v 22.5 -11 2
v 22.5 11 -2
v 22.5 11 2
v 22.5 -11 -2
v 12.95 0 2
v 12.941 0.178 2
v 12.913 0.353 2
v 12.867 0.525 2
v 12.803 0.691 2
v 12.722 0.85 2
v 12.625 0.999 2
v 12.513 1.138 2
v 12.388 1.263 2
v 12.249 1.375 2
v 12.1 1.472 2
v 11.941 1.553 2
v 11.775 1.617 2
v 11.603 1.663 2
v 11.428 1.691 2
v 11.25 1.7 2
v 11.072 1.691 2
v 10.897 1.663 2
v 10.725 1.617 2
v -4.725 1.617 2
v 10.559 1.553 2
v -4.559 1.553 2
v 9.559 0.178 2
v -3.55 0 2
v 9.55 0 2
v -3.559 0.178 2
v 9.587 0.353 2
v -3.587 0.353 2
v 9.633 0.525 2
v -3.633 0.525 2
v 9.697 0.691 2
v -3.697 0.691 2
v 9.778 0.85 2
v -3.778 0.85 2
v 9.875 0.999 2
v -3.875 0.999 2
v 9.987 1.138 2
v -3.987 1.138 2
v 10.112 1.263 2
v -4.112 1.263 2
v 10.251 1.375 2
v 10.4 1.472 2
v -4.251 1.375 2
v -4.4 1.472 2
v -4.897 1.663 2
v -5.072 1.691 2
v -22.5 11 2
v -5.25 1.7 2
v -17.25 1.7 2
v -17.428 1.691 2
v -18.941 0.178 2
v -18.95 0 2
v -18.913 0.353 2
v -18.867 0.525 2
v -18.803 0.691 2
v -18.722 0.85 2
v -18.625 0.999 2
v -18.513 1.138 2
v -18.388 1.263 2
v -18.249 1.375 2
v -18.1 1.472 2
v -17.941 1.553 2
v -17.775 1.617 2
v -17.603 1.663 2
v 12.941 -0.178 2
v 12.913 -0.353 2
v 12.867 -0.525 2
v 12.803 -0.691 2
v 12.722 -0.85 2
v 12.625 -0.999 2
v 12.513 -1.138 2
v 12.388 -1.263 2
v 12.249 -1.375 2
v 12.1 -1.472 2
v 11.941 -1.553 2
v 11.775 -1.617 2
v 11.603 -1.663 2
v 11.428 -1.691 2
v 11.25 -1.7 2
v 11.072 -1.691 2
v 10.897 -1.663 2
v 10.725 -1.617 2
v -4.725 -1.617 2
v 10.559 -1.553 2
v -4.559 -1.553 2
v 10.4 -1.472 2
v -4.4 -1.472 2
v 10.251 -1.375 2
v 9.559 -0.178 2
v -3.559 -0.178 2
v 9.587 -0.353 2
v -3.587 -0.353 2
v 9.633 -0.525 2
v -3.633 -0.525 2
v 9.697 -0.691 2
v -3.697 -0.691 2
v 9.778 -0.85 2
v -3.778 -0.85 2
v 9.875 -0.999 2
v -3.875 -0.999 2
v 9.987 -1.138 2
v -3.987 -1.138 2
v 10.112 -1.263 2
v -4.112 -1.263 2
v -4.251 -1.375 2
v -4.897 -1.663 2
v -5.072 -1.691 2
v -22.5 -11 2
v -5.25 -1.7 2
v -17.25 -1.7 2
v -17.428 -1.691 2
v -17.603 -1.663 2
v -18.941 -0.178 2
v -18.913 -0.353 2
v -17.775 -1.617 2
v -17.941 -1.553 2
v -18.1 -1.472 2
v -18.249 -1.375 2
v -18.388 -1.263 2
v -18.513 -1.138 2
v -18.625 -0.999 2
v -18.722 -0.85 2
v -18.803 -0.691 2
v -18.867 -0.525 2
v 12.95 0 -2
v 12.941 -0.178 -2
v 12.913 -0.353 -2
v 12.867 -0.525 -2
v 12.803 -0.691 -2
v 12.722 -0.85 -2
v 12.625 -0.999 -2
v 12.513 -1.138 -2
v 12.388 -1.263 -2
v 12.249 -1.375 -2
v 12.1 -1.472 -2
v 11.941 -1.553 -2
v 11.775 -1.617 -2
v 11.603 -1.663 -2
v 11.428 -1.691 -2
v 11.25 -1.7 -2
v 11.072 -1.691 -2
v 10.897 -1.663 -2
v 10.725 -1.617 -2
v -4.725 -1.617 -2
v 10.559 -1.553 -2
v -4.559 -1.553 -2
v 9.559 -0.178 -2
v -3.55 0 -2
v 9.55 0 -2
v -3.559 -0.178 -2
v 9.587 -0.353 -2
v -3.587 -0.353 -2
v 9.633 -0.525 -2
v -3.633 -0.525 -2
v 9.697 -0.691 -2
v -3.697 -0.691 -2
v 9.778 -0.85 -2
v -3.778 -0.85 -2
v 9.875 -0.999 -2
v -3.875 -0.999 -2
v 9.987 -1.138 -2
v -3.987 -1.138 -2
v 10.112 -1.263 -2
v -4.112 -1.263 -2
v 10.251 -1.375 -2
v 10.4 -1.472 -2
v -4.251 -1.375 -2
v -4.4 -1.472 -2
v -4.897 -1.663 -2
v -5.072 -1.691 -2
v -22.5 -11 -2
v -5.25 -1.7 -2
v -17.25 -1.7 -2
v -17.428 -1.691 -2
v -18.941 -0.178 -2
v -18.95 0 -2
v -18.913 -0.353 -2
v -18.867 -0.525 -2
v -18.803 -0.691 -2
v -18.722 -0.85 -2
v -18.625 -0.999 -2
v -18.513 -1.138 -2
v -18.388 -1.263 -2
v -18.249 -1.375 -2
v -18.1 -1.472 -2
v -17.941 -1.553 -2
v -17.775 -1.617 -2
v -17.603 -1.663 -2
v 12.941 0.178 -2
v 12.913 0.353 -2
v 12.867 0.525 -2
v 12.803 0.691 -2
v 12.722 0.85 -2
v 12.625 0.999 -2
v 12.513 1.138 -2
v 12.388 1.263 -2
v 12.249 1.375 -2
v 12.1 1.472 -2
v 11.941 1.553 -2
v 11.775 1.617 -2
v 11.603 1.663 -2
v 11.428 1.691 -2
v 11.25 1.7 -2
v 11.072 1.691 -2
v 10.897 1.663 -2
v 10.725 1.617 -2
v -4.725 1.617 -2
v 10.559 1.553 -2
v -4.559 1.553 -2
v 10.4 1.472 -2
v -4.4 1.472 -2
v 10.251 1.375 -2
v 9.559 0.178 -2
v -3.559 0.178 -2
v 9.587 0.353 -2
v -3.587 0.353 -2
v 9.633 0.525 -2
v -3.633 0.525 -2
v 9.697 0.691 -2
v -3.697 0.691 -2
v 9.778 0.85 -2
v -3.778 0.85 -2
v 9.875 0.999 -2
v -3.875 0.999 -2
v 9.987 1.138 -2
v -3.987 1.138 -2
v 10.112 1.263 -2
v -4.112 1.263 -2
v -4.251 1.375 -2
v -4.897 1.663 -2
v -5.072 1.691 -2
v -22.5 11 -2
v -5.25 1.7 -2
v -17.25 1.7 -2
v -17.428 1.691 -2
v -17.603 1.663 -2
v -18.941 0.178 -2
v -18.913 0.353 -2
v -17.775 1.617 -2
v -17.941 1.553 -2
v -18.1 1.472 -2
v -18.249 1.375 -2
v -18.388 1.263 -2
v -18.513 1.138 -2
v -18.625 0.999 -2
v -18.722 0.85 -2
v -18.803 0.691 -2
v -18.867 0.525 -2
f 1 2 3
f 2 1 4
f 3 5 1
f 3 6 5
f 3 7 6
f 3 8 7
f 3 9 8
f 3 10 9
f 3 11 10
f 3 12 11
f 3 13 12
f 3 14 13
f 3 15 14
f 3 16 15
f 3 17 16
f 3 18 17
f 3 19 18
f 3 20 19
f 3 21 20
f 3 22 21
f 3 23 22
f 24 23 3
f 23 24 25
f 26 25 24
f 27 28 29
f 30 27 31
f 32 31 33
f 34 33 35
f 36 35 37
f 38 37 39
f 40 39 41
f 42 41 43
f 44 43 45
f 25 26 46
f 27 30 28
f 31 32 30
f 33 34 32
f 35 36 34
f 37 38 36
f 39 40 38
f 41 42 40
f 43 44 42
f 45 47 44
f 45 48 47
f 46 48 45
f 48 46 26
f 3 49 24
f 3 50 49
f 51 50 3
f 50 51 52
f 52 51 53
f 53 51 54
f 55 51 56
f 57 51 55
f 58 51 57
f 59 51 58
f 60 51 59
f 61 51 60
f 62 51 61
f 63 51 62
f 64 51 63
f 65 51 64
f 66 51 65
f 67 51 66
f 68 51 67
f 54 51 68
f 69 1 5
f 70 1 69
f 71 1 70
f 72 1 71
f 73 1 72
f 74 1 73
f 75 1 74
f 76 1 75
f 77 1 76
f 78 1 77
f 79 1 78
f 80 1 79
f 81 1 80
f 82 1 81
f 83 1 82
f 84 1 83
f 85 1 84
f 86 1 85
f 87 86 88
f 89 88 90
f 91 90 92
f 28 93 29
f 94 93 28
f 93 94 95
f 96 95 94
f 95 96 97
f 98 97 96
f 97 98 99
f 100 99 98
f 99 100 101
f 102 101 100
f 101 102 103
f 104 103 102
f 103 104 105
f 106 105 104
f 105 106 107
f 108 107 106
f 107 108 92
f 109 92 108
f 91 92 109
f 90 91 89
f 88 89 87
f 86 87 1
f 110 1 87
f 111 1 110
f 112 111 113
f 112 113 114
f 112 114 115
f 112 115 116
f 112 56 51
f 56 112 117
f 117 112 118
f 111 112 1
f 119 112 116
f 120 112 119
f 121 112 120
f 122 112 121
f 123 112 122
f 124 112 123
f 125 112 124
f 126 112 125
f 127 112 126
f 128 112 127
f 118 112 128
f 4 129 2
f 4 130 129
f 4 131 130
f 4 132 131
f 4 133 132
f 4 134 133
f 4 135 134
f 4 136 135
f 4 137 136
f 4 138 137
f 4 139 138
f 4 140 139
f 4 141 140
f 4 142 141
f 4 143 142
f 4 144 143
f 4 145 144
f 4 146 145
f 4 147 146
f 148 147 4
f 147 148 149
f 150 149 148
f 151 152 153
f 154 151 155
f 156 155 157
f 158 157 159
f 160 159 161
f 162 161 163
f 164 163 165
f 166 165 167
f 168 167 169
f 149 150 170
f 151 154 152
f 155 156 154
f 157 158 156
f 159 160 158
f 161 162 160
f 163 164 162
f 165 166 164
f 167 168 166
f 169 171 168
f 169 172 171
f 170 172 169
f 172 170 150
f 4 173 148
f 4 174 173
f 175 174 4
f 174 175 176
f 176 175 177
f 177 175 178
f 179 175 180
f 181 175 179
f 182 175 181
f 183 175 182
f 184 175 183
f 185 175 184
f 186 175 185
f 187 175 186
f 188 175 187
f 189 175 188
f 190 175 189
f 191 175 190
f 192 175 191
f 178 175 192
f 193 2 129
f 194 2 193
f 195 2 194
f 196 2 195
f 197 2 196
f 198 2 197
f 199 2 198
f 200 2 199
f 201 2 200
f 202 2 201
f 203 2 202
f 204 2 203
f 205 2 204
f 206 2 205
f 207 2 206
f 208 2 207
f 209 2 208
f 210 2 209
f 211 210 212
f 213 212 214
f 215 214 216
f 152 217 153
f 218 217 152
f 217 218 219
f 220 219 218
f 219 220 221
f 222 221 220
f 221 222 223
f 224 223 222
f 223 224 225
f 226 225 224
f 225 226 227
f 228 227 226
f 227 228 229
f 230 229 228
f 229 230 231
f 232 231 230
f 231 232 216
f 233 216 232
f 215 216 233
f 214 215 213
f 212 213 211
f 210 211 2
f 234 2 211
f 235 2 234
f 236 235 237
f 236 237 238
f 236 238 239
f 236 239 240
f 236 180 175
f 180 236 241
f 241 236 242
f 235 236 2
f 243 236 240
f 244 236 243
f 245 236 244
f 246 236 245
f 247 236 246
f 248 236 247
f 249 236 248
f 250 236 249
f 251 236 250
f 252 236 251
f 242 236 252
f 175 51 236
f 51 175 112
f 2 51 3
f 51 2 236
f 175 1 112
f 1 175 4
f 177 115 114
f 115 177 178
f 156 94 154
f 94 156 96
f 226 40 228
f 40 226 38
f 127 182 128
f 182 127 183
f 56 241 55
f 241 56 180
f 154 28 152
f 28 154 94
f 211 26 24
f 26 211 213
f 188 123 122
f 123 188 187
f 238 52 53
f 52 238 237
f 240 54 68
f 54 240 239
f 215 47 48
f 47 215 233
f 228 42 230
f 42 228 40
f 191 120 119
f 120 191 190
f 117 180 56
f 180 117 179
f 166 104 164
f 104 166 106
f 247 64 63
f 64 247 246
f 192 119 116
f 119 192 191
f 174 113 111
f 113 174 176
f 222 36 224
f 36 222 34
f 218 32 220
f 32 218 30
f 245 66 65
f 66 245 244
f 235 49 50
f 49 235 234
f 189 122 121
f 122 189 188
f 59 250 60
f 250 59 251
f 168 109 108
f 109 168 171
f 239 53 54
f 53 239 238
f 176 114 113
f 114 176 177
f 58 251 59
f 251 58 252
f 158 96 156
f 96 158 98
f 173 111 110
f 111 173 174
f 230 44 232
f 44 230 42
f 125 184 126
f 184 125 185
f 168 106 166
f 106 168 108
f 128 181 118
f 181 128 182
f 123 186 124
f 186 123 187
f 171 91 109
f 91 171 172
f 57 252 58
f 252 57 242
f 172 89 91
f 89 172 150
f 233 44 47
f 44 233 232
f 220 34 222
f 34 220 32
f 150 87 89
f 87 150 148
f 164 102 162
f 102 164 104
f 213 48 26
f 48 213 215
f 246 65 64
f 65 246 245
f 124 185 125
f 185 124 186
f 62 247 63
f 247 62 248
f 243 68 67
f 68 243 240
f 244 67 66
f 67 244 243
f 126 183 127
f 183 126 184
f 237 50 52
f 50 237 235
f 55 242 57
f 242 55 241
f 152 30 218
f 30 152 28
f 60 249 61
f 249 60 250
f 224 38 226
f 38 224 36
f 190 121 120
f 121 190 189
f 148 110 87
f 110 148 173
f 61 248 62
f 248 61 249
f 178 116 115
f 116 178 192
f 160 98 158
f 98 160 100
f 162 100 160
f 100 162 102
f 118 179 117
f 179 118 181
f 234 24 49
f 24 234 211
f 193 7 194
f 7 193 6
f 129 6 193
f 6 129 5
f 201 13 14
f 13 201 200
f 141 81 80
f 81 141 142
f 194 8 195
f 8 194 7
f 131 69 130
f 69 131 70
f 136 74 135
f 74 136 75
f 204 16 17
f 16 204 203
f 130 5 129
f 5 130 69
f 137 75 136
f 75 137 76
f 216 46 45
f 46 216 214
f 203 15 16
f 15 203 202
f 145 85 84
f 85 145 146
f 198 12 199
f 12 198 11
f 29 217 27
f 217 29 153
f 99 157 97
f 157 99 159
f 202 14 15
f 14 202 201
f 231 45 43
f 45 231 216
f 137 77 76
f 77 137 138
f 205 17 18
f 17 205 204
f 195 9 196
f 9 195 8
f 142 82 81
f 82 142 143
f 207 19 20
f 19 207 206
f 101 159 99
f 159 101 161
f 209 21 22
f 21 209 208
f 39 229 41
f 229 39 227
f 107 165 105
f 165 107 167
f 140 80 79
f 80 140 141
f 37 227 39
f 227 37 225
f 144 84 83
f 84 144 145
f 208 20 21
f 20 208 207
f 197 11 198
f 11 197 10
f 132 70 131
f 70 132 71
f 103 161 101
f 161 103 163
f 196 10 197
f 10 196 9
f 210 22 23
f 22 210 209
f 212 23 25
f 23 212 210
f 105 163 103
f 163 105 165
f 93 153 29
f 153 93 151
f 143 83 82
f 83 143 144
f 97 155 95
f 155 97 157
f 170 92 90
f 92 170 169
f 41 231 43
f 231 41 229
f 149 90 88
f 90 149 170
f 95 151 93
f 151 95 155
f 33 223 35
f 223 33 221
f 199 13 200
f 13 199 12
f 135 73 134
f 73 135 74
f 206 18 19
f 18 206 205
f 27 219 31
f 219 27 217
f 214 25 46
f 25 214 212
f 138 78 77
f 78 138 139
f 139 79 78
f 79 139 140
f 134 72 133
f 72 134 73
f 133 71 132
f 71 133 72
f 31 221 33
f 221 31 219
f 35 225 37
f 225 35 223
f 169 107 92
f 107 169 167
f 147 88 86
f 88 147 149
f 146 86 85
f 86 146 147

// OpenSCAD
// Adjustable sensor mounting tab.
$fn = 60;
eps = 0.02;
length = 45;
width = 22;
thickness = 4;
slot_l = 12;
module slot(x) { hull() { translate([x-slot_l/2,0,-thickness/2-eps]) cylinder(d=3.4,h=thickness+2*eps); translate([x+slot_l/2,0,-thickness/2-eps]) cylinder(d=3.4,h=thickness+2*eps); } }
difference() { cube([length,width,thickness],center=true); slot(-length/4); translate([length/4,0,-thickness/2-eps]) cylinder(d=3.4,h=thickness+2*eps); }
